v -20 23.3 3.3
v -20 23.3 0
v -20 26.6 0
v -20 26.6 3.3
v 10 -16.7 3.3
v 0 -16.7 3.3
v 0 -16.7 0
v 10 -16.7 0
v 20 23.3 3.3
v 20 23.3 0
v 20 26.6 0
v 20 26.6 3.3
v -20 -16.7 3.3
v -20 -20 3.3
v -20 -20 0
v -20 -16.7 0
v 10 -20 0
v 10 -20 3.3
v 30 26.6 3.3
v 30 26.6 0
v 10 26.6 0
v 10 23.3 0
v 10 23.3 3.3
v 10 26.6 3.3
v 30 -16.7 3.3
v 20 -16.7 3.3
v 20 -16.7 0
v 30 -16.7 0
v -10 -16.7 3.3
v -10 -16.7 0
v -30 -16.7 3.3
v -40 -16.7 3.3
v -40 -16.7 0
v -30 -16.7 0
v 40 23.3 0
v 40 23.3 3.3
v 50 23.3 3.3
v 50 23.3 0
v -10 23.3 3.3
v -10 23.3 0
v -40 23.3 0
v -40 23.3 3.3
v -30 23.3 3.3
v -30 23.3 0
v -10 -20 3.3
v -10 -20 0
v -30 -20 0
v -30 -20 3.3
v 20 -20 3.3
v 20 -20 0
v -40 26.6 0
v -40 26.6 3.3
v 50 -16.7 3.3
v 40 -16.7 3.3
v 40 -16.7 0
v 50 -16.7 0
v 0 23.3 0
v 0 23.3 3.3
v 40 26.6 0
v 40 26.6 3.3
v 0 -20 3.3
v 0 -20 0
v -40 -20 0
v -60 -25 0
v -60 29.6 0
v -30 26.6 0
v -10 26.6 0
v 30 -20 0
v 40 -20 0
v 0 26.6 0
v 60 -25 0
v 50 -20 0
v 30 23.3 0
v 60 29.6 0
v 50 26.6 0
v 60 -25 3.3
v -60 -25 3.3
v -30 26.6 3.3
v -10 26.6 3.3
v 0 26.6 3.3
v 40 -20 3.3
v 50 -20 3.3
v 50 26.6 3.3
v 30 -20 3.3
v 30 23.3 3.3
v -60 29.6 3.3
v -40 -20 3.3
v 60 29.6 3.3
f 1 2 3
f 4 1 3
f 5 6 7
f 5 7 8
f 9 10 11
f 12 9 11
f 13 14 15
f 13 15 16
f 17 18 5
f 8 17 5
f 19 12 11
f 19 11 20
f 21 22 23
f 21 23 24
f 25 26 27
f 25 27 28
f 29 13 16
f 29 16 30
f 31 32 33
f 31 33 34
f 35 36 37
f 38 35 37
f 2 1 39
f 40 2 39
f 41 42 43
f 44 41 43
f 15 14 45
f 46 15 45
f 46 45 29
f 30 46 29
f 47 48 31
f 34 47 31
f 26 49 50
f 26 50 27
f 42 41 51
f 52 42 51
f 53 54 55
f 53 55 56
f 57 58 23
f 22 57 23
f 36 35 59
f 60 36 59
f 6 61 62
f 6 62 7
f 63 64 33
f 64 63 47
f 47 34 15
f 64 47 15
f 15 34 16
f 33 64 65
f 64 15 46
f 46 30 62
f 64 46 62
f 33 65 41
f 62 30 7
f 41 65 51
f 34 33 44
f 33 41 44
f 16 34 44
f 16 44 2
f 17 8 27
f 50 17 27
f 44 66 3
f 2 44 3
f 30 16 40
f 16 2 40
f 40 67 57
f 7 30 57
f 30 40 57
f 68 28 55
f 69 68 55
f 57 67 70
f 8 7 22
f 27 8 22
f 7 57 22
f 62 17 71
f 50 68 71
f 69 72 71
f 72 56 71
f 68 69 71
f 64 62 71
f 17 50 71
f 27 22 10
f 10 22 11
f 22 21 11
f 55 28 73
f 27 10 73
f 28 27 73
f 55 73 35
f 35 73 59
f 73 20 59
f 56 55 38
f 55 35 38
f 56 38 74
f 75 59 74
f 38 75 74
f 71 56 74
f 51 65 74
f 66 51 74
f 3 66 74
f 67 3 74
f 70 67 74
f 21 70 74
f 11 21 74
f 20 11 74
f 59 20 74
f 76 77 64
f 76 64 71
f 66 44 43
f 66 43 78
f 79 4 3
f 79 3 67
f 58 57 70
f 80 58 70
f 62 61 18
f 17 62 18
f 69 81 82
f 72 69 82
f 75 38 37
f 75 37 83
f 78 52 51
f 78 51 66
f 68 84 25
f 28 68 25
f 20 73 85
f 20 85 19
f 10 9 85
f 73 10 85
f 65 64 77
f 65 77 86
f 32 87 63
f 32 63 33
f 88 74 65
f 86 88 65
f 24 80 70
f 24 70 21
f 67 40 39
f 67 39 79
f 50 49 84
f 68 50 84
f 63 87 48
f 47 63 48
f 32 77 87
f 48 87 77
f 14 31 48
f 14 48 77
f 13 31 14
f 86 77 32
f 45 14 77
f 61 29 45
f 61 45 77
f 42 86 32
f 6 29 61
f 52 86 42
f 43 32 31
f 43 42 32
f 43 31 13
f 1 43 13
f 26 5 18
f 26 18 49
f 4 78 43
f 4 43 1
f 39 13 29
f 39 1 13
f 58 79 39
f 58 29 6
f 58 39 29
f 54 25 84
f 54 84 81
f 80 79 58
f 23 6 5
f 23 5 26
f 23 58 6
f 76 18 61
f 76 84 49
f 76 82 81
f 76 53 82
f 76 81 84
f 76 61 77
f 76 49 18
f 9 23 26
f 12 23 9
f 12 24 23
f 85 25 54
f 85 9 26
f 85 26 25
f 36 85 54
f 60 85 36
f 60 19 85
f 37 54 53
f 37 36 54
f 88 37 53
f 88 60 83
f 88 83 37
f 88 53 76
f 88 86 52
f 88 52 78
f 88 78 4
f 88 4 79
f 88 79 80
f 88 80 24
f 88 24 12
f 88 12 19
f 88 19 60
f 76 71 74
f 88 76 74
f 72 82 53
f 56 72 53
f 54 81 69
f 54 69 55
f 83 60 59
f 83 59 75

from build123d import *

# Parameters (mm, degrees)
SKETCH1_W           = 120
SKETCH1_H           = 120
BOSS_EXTRUDE1_DEPTH = 3.3
SKETCH2_W           = 10
SKETCH2_H           = 3.3
CUT_EXTRUDE1_DEPTH  = 3.3
LPATTERN1_COUNT     = 5
LPATTERN1_PITCH     = 20
SKETCH3_W           = 120
SKETCH3_H           = 30.4
CUT_EXTRUDE2_DEPTH  = 3.3
SKETCH4_W           = 120
SKETCH4_H           = 3.3
CUT_EXTRUDE3_DEPTH  = 35


with BuildPart() as part:
    # Sketch1 → Boss-Extrude1 (new body)
    with BuildSketch(Plane.XY):
        Rectangle(SKETCH1_W, SKETCH1_H)
    extrude(amount=BOSS_EXTRUDE1_DEPTH)

    # Sketch2 → Cut-Extrude1 (cut)
    with BuildSketch(Plane.XY.offset(3.3)):
        with Locations((45, -18.35)):
            Rectangle(SKETCH2_W, SKETCH2_H)
        with Locations((45, 24.95)):
            Rectangle(SKETCH2_W, SKETCH2_H)
    cut_extrude1 = extrude(amount=-CUT_EXTRUDE1_DEPTH, mode=Mode.SUBTRACT)

    # LPattern1: Cut-Extrude1 ×5
    with Locations(*[(-i * LPATTERN1_PITCH, 0, 0) for i in range(1, LPATTERN1_COUNT)]):
        add(cut_extrude1, mode=Mode.SUBTRACT)

    # Sketch3 → Cut-Extrude2 (cut)
    with BuildSketch(Plane(origin=(0, 0, 0), x_dir=(-1, 0, 0), z_dir=(0, 0, -1))):
        with Locations((0, 44.8)):
            Rectangle(SKETCH3_W, SKETCH3_H)
    extrude(amount=-CUT_EXTRUDE2_DEPTH, mode=Mode.SUBTRACT)

    # Sketch4 → Cut-Extrude3 (cut)
    with BuildSketch(Plane.XZ.offset(60)):
        with Locations((0, 1.65)):
            Rectangle(SKETCH4_W, SKETCH4_H)
    extrude(amount=-CUT_EXTRUDE3_DEPTH, mode=Mode.SUBTRACT)


solid = part.part
